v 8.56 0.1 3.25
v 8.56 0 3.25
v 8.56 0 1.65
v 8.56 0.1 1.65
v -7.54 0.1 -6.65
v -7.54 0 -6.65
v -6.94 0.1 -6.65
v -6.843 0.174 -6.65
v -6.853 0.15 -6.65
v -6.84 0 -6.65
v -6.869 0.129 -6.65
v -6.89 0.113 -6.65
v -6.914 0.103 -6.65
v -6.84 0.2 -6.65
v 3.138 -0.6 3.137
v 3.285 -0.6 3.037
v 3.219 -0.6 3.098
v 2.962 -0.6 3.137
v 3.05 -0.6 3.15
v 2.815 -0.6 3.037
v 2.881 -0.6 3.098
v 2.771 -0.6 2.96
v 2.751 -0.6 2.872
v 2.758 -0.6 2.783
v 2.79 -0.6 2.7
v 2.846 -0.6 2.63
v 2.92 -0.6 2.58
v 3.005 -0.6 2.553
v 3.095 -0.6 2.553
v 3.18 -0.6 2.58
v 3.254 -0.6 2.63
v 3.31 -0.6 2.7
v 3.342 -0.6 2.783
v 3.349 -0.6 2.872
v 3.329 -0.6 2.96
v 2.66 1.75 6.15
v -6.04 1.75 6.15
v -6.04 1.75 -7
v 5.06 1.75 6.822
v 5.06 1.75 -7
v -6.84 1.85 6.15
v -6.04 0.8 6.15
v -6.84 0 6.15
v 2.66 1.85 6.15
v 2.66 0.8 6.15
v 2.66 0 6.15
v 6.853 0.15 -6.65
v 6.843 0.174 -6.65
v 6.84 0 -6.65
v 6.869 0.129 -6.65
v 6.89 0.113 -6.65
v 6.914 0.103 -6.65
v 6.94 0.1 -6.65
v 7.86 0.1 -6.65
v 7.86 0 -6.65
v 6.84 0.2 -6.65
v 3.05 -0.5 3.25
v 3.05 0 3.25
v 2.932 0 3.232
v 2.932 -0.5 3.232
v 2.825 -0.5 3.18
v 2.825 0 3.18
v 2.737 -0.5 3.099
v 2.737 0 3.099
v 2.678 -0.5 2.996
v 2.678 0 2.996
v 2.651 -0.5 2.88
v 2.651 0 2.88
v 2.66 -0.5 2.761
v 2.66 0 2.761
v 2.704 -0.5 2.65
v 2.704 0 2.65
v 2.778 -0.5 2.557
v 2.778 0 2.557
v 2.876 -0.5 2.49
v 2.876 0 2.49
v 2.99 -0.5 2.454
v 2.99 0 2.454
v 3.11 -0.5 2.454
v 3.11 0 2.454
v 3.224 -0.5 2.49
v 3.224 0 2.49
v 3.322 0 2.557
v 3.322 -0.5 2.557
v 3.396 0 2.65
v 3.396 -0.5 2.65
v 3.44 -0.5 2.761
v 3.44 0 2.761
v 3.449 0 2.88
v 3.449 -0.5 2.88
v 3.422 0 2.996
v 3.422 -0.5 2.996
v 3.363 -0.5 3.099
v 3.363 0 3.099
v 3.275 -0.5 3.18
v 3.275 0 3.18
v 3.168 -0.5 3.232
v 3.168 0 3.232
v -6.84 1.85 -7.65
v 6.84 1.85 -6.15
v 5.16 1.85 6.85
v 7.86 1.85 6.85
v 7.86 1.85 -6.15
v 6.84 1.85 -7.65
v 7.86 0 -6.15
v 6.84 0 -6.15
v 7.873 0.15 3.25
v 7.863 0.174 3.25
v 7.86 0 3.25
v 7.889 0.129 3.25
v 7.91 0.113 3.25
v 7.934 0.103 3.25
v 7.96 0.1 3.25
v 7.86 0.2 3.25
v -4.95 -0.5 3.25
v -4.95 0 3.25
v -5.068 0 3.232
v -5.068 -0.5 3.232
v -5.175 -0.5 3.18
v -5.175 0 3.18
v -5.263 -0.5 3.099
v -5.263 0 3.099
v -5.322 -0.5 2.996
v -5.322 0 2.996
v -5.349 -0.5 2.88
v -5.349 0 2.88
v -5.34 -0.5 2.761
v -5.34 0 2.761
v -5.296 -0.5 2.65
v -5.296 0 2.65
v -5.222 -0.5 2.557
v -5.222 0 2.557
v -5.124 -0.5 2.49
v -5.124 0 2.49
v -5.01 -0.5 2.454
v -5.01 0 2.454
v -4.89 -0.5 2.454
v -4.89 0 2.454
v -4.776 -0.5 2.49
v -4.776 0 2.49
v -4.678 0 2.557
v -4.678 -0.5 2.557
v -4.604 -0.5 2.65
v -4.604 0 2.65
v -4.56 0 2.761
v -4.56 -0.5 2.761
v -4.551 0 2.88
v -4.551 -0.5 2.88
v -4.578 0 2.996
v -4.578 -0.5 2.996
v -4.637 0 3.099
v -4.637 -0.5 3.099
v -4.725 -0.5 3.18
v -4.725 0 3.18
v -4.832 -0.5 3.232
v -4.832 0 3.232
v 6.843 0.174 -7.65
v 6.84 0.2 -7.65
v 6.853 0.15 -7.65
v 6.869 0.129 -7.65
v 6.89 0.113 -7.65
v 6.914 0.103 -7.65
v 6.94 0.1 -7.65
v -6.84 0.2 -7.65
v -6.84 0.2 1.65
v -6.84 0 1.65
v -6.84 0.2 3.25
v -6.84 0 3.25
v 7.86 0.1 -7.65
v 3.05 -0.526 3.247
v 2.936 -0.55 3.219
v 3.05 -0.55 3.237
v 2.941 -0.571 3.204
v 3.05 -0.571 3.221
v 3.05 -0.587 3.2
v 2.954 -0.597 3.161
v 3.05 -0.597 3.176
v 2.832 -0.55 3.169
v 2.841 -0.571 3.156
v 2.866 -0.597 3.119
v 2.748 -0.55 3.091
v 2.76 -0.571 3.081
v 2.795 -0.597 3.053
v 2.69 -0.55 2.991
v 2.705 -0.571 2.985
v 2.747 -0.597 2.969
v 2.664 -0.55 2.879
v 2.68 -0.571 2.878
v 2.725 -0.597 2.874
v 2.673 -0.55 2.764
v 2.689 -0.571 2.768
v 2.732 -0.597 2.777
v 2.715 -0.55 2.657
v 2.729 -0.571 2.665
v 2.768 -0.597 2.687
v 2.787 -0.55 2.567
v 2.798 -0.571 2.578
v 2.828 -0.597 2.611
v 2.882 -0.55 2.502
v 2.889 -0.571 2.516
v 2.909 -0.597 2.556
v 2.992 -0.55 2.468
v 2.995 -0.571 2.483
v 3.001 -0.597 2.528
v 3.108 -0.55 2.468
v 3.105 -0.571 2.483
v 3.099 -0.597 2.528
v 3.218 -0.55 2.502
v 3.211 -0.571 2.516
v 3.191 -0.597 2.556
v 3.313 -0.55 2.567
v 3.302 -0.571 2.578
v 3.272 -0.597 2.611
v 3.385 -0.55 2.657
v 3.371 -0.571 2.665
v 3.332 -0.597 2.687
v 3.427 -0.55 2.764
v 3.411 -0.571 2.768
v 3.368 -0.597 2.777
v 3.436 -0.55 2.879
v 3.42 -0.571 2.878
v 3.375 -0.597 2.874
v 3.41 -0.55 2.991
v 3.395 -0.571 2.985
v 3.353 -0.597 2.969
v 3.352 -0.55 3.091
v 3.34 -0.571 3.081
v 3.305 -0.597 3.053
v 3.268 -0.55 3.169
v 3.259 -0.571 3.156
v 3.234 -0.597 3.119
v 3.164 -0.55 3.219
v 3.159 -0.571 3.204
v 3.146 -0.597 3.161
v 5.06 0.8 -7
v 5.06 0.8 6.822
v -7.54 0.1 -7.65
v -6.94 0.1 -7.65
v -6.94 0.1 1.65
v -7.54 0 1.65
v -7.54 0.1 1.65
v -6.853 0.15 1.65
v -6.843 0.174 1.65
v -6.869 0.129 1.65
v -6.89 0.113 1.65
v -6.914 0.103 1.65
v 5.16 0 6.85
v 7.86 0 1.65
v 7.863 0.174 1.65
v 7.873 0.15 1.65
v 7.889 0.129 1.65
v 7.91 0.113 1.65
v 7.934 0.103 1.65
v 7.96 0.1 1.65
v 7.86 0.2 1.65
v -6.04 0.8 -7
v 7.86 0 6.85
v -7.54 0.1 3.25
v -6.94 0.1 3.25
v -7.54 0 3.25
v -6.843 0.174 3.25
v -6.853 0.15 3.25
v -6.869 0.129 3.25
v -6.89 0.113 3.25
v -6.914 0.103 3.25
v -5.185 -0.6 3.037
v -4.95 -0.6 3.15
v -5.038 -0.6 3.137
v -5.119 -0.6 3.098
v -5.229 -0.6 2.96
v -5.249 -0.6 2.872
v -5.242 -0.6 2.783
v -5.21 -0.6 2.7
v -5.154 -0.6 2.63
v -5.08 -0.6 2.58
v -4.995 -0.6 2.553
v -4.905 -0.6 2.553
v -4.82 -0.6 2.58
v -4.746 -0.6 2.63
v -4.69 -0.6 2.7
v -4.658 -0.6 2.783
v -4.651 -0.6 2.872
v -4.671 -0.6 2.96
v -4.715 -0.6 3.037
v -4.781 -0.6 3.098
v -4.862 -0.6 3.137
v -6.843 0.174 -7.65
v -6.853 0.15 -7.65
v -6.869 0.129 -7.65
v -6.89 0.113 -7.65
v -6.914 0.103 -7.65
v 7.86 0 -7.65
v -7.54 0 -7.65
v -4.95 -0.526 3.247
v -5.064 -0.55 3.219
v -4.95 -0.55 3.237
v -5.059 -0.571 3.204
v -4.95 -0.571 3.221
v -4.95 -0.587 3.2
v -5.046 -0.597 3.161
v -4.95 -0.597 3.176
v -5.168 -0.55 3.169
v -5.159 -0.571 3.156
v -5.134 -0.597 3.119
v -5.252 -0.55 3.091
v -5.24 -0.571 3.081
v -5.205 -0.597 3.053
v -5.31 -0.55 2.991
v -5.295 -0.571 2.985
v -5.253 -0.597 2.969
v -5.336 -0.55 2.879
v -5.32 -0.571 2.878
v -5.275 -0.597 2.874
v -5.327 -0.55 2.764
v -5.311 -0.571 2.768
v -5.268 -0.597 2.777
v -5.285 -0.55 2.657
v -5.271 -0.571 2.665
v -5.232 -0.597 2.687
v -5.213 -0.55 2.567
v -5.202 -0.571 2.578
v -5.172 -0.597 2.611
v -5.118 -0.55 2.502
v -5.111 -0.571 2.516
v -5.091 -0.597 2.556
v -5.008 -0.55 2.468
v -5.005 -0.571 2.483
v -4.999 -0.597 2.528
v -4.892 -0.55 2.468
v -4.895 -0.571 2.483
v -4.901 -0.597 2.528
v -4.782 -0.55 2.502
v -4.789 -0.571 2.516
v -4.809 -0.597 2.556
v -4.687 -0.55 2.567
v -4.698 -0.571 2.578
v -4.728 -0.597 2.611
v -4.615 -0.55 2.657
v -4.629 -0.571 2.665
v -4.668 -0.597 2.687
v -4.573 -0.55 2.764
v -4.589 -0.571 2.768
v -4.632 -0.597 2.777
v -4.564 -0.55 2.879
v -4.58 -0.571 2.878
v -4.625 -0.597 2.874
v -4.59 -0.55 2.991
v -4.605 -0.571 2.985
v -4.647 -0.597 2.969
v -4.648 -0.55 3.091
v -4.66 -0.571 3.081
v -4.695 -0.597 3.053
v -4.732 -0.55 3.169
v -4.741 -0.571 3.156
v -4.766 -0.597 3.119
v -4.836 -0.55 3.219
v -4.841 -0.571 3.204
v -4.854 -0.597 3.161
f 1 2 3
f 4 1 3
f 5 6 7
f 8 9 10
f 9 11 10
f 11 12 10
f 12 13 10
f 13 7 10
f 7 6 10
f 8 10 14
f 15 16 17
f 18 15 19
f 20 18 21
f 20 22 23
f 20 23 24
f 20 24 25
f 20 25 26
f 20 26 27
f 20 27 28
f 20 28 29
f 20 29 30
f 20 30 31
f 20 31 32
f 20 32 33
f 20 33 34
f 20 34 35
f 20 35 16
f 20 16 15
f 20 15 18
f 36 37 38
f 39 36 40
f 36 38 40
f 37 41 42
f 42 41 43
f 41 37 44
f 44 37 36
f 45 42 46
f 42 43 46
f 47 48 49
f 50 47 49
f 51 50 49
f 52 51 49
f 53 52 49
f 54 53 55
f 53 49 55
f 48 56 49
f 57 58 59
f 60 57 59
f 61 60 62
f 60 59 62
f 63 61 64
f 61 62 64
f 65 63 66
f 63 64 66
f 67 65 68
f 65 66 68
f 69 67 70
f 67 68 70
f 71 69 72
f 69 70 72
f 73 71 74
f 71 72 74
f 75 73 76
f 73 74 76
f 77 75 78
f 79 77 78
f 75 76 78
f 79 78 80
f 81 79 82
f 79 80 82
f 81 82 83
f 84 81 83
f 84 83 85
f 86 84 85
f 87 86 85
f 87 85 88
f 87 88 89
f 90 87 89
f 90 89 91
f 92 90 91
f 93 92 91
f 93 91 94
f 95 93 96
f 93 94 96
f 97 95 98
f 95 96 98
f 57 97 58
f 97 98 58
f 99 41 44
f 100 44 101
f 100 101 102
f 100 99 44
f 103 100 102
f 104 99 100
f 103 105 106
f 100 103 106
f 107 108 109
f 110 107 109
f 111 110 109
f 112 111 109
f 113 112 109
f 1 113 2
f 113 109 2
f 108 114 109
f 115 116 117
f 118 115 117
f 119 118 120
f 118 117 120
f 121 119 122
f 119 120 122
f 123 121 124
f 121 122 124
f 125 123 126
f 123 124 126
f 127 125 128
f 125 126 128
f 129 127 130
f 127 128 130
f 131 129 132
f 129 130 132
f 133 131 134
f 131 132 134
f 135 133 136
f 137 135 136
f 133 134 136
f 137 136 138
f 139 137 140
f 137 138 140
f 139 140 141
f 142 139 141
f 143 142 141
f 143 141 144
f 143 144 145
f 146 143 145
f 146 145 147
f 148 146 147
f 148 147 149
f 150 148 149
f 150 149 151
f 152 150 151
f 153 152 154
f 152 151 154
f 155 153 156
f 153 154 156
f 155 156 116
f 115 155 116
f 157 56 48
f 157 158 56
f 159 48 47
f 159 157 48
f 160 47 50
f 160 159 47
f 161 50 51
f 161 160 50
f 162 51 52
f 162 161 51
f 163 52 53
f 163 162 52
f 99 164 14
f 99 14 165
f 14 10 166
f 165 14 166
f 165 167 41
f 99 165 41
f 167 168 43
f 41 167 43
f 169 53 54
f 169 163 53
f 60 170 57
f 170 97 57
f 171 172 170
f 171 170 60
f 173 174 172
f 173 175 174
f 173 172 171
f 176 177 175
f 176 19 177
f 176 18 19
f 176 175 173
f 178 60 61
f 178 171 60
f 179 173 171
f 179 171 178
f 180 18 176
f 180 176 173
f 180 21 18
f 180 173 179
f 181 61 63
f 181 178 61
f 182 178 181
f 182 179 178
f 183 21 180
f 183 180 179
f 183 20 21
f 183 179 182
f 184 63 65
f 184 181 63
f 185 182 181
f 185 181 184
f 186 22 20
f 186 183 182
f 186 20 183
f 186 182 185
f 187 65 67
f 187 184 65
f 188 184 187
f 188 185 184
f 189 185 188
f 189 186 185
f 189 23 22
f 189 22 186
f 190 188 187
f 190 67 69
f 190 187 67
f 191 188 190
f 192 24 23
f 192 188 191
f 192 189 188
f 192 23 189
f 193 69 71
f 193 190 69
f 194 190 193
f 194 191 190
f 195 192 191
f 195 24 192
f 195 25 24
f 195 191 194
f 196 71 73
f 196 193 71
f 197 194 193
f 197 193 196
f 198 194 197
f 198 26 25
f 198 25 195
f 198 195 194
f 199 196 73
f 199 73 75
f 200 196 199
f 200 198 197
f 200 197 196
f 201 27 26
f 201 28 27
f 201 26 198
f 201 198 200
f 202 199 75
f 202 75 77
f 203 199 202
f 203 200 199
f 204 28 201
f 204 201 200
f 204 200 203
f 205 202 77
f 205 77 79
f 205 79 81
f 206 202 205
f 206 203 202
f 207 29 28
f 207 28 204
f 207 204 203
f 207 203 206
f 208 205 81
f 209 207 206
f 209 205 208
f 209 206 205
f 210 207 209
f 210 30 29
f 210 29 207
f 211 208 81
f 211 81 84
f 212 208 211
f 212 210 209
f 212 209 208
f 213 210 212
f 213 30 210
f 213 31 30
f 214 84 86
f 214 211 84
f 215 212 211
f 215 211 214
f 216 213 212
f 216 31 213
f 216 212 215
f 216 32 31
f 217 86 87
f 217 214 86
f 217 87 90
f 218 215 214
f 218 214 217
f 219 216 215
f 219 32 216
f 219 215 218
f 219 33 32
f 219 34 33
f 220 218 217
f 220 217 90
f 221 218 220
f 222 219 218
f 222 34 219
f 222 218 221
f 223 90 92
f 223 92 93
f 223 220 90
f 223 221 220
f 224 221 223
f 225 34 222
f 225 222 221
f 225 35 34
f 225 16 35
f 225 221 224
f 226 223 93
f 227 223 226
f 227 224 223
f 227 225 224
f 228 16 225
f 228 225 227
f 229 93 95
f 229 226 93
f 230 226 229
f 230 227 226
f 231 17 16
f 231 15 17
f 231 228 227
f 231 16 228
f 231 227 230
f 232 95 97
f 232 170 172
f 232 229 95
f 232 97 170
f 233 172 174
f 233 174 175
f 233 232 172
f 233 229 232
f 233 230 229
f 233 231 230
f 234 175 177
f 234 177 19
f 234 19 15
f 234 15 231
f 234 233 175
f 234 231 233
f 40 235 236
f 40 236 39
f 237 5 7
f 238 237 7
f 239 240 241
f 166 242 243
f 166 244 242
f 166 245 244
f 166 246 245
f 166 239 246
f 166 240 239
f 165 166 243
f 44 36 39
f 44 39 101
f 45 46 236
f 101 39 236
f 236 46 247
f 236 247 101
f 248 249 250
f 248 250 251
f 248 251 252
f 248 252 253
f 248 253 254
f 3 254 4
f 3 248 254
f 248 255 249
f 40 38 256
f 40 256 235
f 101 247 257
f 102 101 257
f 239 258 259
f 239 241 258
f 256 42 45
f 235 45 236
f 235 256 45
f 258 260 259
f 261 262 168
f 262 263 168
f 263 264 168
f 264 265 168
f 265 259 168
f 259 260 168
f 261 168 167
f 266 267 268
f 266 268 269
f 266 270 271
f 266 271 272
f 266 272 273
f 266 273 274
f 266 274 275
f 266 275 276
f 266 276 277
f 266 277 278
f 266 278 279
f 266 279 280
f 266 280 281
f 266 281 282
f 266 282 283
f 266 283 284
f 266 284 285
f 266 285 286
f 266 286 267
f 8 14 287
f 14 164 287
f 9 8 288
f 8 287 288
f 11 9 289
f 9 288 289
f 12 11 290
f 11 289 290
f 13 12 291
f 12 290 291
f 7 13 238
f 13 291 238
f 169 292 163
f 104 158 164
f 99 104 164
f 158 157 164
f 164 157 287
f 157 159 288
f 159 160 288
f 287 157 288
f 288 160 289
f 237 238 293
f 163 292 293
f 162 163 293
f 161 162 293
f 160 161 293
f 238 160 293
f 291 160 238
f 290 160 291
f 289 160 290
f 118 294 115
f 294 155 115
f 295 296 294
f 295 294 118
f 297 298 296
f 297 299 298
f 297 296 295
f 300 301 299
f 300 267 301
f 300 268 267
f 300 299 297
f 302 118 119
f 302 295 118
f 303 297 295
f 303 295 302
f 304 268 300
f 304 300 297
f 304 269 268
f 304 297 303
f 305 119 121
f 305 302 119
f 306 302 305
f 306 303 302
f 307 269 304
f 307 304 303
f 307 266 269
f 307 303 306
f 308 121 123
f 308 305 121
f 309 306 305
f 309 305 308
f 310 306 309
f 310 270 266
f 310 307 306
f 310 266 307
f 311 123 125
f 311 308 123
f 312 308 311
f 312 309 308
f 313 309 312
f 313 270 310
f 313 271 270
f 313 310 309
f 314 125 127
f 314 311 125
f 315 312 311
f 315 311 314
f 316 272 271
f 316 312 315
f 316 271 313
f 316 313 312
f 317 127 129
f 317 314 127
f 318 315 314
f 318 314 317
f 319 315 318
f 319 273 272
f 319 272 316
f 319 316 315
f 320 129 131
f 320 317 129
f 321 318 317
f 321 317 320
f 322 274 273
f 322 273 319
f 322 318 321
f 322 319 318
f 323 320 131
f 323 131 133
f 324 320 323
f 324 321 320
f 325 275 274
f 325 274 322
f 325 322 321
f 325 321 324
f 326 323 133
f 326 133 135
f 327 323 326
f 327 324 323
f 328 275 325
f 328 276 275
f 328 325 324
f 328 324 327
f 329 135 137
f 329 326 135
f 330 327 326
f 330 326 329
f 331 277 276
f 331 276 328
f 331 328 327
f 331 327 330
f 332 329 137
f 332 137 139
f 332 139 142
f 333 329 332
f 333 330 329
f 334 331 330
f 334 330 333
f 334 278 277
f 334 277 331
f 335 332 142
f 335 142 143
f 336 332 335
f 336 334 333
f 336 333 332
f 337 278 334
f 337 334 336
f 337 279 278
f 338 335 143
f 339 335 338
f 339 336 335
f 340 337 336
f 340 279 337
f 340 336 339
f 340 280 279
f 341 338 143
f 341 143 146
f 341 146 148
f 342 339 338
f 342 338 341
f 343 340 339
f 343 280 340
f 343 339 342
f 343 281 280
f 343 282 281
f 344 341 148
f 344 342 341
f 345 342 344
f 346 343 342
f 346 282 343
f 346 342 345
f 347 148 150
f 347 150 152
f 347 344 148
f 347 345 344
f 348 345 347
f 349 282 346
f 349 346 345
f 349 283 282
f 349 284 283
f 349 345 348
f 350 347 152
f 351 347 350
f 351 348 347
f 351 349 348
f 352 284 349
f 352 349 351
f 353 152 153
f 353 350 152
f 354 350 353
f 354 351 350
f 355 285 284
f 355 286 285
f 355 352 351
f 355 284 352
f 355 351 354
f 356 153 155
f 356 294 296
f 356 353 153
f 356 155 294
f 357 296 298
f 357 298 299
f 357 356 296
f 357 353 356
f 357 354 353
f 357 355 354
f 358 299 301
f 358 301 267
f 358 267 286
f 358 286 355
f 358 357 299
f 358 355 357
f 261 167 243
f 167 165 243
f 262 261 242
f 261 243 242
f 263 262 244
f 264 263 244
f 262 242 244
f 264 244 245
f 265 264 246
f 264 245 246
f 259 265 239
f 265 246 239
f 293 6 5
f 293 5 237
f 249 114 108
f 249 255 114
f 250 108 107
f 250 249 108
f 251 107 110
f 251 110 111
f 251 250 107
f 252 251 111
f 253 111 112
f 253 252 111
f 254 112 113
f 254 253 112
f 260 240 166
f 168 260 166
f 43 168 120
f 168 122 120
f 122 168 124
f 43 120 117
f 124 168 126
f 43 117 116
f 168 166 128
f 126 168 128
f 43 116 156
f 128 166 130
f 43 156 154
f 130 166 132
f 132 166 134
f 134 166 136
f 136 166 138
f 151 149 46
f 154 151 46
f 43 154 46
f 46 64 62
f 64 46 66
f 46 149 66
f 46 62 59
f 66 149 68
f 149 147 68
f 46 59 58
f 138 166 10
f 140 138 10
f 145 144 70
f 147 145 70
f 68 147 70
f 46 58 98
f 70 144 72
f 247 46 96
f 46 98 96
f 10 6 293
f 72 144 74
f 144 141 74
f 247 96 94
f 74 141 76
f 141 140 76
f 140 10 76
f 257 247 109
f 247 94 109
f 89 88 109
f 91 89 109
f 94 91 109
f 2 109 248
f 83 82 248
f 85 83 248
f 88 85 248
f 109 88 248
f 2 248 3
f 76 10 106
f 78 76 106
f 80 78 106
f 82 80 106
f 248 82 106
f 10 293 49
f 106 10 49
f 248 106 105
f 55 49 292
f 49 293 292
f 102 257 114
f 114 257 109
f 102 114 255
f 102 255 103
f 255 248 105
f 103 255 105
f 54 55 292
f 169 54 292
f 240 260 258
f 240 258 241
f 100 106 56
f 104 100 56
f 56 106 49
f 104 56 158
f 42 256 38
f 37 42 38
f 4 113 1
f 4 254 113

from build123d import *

# Parameters (mm, degrees)
EXTRUDE_1_DEPTH          = 1.85
SKETCH_2_W               = 0.7
SKETCH_2_H               = 1.6
SKETCH_2_W_2             = 1.02
SKETCH_2_H_2             = 1
EXTRUDE_2_DEPTH          = 0.1
SKETCH_3_R               = 0.4
EXTRUDE_3_DEPTH          = 0.6
CUT_EXTRUDE_1_DEPTH      = 12.62835328
CUT_EXTRUDE_1_DEPTH_BACK = 7
SKETCH_4_W               = 11.1
SKETCH_4_H               = 0.95
FILLET_1_R               = 0.1
FILLET_2_R               = 0.1


with BuildPart() as part:
    # 스케치1 → 보스-돌출1 (new body)
    with BuildSketch(Plane(origin=(0, 0, 0), x_dir=(1, 0, 0), z_dir=(0, 1, 0))):
        Polygon((2.66, -6.15), (5.16, -6.85), (7.86, -6.85), (7.86, 6.15), (6.84, 6.15), (6.84, 7.65), (-6.84, 7.65), (-6.84, -6.15), align=None)
    extrude(amount=EXTRUDE_1_DEPTH)

    # 스케치2 → 보스-돌출2 (add)
    with BuildSketch(Plane(origin=(0, 0, 0), x_dir=(1, 0, 0), z_dir=(0, 1, 0))):
        with Locations((8.21, -2.45)):
            Rectangle(SKETCH_2_W, SKETCH_2_H)
        with Locations((7.35, 7.15)):
            Rectangle(SKETCH_2_W_2, SKETCH_2_H_2)
        with Locations((-7.19, 7.15)):
            Rectangle(SKETCH_2_W, SKETCH_2_H_2)
        with Locations((-7.19, -2.45)):
            Rectangle(SKETCH_2_W, SKETCH_2_H)
    extrude(amount=EXTRUDE_2_DEPTH)

    # 스케치3 → 보스-돌출3 (add)
    with BuildSketch(Plane.XZ):
        with Locations(Location((-4.95, 2.85, 0), (0, 0, 90))):
            Circle(SKETCH_3_R)
        with Locations(Location((3.05, 2.85, 0), (0, 0, 90))):
            Circle(SKETCH_3_R)
    extrude(amount=EXTRUDE_3_DEPTH)

    # 스케치4 → 컷-돌출1 (cut, two sides: drawn at the far end of the back side and taken through both)
    with BuildSketch(Plane.XY.offset(-CUT_EXTRUDE_1_DEPTH_BACK)):
        with Locations((-0.49, 1.275)):
            Rectangle(SKETCH_4_W, SKETCH_4_H)
    extrude(amount=CUT_EXTRUDE_1_DEPTH + CUT_EXTRUDE_1_DEPTH_BACK, mode=Mode.SUBTRACT)

    # 필렛1
    fillet_1_edges = [part.edges().sort_by_distance(p)[0] for p in [
        (-4.95, -0.6, 2.45),
        (3.05, -0.6, 2.45),
    ]]
    fillet(fillet_1_edges, radius=FILLET_1_R)

    # 필렛2
    fillet_2_edges = [part.edges().sort_by_distance(p)[0] for p in [
        (6.84, 0.1, -7.15),
        (7.86, 0.1, 2.45),
        (-6.84, 0.1, -7.15),
        (-6.84, 0.1, 2.45),
    ]]
    fillet(fillet_2_edges, radius=FILLET_2_R)


solid = part.part
